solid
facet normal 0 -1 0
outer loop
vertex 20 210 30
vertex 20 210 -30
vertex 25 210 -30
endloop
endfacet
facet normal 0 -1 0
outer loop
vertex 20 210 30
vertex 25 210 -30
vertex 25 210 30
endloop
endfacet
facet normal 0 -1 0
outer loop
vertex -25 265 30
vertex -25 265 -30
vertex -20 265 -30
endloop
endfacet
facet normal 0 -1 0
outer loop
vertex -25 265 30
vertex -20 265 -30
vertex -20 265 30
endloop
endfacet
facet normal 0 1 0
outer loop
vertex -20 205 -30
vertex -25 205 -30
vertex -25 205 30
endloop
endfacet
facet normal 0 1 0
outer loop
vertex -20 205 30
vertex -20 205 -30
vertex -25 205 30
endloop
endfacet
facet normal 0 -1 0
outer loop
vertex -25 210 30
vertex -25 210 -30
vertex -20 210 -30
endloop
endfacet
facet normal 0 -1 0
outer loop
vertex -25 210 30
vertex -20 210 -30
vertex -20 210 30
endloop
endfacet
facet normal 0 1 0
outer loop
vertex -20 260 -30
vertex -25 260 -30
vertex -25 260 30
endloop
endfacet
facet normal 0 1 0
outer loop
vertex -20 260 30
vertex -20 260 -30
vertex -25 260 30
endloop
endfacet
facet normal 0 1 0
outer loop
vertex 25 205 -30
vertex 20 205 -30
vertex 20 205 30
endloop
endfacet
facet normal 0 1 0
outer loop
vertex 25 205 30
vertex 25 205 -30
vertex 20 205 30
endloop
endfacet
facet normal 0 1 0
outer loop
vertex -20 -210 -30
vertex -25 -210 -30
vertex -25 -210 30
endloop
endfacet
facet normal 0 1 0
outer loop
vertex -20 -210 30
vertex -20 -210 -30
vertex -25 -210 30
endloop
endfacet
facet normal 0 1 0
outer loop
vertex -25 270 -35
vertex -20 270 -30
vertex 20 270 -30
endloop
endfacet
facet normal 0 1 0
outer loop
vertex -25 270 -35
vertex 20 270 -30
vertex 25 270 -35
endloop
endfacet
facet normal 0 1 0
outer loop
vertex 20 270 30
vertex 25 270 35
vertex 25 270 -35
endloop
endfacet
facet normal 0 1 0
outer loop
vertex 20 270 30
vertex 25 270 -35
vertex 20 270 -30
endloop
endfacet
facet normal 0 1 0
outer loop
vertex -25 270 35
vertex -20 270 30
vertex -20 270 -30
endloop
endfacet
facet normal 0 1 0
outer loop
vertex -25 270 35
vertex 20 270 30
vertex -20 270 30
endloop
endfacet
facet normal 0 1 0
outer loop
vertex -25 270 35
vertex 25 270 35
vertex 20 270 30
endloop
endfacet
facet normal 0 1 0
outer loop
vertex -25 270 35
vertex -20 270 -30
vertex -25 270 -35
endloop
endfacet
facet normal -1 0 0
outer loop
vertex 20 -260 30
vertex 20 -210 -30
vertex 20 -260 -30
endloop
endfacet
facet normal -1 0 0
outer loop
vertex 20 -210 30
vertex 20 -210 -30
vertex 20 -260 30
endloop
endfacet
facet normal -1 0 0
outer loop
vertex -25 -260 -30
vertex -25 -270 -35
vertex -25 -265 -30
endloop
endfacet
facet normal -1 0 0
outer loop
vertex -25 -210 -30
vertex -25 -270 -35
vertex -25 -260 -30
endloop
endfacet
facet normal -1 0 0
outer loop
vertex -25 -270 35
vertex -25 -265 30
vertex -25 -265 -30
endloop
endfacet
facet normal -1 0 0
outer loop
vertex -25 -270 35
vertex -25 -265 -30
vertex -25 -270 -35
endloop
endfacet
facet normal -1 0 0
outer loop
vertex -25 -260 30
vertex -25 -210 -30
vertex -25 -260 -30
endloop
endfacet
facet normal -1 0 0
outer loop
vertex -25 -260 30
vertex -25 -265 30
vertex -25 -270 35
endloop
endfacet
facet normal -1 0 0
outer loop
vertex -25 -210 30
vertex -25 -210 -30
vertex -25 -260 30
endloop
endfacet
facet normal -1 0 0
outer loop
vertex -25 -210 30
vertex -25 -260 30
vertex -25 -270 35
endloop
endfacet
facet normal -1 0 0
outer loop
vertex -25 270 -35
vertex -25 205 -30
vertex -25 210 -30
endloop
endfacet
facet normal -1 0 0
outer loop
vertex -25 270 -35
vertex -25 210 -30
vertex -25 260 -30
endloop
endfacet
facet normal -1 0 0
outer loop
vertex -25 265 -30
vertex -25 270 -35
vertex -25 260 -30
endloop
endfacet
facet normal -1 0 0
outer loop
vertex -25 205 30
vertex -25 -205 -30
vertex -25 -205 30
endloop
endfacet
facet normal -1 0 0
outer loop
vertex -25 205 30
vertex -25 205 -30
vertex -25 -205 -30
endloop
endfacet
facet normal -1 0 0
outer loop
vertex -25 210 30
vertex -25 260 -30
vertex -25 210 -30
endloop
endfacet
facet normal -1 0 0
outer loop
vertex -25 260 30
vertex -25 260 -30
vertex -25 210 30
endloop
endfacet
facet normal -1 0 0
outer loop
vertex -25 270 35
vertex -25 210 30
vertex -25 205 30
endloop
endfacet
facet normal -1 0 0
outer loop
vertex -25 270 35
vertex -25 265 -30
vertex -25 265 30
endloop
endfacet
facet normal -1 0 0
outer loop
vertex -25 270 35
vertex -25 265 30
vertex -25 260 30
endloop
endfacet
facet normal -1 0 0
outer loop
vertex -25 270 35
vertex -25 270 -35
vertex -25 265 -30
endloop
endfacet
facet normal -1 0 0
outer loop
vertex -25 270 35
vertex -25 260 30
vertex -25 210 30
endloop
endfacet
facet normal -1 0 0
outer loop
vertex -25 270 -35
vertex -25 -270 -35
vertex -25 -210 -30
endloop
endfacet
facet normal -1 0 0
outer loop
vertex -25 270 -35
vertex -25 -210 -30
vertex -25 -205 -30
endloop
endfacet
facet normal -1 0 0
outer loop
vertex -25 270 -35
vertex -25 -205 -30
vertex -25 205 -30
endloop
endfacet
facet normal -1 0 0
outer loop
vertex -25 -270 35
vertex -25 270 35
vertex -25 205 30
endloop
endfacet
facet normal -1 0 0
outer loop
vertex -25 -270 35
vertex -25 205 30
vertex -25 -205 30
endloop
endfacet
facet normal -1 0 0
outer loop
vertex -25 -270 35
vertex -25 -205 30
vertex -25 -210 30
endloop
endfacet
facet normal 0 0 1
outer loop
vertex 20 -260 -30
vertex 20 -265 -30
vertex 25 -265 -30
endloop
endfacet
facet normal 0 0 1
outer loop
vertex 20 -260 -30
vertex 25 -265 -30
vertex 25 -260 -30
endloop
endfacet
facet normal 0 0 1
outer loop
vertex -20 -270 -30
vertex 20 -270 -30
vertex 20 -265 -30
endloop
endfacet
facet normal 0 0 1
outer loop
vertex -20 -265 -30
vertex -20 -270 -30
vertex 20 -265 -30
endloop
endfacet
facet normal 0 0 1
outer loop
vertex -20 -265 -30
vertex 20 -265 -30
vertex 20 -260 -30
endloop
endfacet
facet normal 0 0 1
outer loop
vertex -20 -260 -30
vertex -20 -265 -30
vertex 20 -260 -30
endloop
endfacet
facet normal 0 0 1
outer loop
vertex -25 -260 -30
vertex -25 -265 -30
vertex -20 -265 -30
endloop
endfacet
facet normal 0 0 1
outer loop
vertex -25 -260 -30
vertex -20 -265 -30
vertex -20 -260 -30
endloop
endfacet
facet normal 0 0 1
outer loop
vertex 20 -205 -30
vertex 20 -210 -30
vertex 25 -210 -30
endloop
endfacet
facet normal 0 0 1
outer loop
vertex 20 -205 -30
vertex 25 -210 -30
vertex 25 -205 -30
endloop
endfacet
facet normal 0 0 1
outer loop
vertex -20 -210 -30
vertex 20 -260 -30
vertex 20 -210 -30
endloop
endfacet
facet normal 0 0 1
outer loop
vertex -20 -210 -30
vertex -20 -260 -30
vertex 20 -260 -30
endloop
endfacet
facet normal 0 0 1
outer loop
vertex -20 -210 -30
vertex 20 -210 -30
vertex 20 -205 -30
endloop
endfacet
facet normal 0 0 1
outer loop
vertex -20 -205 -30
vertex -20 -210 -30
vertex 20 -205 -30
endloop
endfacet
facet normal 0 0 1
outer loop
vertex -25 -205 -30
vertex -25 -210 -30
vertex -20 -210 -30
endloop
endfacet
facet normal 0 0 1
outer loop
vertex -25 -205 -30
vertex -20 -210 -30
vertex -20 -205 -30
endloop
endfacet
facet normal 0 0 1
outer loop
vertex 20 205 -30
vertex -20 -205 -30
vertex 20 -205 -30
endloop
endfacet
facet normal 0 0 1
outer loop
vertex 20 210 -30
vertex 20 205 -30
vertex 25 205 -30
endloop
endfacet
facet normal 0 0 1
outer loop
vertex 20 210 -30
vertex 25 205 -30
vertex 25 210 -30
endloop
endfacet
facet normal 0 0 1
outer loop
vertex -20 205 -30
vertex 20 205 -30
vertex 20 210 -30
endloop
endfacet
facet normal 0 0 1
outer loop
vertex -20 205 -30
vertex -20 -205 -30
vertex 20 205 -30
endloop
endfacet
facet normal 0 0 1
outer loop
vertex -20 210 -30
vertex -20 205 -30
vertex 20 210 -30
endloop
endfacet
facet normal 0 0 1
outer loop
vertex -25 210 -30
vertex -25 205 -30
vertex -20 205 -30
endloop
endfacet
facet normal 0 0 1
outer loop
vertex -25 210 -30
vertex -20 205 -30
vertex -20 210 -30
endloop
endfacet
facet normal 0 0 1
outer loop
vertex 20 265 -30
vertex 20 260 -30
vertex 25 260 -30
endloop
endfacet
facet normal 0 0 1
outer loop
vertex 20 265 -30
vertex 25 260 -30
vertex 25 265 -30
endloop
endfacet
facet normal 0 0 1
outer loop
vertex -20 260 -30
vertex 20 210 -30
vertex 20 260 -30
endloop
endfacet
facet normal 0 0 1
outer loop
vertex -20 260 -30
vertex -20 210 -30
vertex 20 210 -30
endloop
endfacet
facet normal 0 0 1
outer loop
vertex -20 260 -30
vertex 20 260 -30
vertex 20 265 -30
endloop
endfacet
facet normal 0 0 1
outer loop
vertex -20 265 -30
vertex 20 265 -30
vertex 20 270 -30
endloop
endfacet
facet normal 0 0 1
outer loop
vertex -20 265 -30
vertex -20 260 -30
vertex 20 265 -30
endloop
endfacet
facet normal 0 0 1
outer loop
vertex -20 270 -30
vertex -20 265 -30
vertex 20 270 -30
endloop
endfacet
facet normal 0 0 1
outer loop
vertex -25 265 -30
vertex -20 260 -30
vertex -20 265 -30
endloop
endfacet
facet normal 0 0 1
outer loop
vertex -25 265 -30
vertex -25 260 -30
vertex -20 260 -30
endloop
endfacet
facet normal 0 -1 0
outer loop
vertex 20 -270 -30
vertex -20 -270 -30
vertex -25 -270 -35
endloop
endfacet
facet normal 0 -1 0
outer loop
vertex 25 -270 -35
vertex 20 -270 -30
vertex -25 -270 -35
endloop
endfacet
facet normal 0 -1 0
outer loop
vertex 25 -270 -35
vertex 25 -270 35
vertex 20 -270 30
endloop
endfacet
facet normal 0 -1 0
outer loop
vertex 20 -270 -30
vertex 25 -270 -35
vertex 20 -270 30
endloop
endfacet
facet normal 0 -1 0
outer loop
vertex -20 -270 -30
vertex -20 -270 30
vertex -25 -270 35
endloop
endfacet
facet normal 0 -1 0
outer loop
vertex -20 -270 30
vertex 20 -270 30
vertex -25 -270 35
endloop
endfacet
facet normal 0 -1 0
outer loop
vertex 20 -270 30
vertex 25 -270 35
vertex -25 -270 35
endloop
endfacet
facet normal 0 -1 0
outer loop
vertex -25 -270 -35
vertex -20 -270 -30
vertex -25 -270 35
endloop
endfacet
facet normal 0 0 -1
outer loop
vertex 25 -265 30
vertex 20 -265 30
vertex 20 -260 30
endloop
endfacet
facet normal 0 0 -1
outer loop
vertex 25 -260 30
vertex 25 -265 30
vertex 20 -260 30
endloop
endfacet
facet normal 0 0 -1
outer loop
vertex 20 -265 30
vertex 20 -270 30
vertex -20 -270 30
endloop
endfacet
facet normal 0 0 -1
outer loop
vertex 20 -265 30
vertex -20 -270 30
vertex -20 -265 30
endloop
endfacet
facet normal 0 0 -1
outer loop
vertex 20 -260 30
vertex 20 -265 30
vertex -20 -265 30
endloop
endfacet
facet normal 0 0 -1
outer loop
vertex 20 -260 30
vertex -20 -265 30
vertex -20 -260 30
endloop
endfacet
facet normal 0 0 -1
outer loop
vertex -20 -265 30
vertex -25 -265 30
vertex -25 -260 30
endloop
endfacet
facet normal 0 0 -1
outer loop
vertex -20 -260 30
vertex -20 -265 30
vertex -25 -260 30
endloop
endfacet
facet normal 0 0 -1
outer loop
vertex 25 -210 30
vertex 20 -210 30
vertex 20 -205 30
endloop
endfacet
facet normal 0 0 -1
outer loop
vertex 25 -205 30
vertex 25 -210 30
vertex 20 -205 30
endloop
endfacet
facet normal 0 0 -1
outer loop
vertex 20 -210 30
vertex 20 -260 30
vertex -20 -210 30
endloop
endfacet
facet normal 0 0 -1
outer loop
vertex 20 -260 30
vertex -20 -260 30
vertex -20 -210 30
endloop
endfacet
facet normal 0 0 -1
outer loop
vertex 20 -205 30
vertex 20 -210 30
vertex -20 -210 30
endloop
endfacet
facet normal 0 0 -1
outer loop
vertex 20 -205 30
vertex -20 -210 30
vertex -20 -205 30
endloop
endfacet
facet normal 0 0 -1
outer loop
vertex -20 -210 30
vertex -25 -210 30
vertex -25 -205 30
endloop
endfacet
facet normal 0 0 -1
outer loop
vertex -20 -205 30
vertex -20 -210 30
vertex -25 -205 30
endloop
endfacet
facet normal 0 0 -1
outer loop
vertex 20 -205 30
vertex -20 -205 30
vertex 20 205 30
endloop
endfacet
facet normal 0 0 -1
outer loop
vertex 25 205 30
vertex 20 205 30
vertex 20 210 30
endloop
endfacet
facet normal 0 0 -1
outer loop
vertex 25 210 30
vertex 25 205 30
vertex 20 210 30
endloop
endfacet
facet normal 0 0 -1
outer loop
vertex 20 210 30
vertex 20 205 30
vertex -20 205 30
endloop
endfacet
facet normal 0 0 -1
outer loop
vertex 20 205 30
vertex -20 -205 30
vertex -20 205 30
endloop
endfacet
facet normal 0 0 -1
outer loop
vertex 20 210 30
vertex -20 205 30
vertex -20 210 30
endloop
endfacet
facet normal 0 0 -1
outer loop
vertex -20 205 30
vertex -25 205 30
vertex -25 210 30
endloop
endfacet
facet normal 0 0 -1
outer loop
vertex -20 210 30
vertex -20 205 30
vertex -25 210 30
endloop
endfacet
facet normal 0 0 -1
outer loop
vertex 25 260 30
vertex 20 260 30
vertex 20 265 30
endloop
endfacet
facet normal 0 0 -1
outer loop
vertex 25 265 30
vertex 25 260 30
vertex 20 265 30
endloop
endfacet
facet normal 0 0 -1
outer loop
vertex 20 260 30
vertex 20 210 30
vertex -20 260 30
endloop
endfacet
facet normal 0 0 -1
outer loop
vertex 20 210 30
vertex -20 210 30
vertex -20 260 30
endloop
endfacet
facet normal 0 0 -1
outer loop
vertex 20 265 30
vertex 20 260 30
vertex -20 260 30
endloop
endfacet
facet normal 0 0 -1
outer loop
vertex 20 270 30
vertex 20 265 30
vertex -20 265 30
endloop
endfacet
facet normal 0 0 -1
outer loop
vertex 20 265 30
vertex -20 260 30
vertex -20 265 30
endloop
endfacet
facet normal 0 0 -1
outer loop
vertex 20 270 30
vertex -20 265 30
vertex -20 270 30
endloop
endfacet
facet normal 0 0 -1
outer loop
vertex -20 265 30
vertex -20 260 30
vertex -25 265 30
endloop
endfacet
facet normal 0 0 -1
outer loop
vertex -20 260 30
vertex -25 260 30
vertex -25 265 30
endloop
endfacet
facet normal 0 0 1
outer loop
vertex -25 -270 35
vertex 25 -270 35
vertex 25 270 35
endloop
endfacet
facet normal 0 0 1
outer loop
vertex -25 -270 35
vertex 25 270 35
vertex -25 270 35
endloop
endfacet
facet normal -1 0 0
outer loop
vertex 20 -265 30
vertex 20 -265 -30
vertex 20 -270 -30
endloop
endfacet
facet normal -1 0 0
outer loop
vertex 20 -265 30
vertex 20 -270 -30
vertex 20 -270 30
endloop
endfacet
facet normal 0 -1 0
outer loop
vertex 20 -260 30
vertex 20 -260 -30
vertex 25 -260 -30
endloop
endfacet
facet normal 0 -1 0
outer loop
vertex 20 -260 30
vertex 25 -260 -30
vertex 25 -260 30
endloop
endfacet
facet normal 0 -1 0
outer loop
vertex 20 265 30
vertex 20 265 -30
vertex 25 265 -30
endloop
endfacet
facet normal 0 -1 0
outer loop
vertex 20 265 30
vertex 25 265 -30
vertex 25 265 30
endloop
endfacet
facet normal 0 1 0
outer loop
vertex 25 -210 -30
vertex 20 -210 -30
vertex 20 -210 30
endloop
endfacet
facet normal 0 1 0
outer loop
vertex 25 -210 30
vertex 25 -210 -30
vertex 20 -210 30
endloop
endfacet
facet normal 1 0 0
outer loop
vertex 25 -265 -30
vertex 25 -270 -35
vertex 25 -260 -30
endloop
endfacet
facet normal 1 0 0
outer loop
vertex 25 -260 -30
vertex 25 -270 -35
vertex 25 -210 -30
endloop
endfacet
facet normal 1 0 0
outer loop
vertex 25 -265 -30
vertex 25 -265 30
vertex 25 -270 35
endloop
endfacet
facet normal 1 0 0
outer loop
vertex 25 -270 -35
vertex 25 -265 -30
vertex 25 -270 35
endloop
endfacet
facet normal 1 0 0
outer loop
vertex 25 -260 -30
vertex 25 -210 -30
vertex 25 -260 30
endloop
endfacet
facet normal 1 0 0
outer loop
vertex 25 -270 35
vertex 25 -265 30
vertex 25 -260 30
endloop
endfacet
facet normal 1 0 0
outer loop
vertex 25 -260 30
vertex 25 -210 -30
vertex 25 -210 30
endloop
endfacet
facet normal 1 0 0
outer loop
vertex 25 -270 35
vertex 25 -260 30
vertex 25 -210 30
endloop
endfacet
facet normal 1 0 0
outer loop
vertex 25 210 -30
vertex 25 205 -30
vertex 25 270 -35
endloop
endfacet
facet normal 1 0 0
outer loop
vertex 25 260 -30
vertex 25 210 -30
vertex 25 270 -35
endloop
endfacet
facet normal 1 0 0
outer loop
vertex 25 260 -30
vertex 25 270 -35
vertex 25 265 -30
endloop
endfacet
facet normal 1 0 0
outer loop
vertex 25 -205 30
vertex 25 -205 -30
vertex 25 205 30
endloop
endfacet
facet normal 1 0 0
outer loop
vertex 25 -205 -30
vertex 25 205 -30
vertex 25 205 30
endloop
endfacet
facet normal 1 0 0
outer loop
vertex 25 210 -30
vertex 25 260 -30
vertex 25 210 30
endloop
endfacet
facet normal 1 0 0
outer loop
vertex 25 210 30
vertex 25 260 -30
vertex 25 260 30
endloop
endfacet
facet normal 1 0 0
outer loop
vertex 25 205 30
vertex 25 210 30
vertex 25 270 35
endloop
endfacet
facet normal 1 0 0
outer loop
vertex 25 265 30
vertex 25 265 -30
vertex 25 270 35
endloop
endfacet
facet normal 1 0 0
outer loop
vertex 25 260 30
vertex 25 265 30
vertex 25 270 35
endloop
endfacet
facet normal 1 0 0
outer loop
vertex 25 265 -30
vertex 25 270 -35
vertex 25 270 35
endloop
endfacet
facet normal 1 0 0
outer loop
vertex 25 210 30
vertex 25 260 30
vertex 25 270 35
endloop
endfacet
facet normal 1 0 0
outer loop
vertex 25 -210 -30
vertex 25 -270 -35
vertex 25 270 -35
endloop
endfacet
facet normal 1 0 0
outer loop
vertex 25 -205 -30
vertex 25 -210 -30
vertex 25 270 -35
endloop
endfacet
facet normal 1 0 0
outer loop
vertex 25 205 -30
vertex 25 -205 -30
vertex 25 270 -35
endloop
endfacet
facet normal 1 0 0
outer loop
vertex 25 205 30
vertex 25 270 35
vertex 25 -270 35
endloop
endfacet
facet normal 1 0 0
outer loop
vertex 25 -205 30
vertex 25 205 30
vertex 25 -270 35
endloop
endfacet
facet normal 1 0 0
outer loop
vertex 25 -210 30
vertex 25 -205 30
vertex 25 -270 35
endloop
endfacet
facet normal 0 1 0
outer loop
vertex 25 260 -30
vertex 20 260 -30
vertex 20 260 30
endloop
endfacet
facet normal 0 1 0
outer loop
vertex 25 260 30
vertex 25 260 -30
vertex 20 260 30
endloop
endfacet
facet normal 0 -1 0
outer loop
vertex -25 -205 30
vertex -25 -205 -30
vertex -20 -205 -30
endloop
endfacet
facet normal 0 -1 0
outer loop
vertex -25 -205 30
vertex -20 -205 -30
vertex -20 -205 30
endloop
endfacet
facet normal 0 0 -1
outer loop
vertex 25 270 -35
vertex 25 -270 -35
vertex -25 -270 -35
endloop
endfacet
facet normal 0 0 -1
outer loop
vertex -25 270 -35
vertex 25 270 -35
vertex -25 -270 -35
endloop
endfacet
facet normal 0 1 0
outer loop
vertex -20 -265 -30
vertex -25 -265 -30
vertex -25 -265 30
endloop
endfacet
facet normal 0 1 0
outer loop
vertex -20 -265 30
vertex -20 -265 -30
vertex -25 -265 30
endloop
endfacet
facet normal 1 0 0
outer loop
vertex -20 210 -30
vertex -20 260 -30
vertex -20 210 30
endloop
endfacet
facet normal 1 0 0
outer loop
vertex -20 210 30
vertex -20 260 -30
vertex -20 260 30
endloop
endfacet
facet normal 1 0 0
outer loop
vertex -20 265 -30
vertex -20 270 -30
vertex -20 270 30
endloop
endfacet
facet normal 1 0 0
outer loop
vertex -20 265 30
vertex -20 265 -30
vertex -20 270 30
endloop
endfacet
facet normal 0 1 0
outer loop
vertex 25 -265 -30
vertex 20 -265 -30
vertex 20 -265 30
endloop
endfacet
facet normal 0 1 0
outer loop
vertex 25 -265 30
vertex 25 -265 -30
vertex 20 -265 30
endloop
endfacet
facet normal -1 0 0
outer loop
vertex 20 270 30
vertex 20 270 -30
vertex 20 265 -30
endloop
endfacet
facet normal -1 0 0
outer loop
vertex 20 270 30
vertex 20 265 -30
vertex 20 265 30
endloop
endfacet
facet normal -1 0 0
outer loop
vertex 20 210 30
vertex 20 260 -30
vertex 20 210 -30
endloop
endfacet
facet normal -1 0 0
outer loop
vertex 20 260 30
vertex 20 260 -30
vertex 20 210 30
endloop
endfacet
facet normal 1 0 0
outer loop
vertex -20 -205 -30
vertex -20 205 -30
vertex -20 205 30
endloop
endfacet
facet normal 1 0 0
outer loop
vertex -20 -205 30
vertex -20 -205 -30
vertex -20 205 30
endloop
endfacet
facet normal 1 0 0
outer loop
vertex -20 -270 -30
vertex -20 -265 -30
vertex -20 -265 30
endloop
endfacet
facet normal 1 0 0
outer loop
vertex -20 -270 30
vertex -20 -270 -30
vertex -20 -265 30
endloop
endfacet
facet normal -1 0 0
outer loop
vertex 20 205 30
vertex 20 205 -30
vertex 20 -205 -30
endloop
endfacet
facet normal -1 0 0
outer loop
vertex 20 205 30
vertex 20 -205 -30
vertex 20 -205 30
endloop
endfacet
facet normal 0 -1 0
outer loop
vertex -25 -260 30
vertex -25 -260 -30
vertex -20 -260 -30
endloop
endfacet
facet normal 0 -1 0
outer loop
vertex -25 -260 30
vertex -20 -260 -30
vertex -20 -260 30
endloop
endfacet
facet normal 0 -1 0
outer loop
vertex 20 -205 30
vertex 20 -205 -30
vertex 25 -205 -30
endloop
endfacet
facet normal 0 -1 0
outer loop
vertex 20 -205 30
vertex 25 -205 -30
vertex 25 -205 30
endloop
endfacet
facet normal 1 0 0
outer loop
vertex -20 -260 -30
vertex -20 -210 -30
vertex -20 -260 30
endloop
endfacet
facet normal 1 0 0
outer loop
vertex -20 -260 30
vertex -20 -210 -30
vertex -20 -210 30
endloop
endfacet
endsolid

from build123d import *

# Parameters (mm, degrees)
SKETCH1_W               = 50
SKETCH1_H               = 70
BOSS_EXTRUDE1_DEPTH     = 270
SHELL1_T                = -5
CUT_EXTRUDE1_DEPTH      = 277.812210713
CUT_EXTRUDE1_DEPTH_BACK = 277.812210713
SKETCH2_W               = 5
SKETCH2_H               = 60


with BuildPart() as part:
    # Sketch1 → Boss-Extrude1 (new, symmetric)
    with BuildSketch(Plane(origin=(0, 0, 0), x_dir=(-1, 0, 0), z_dir=(0, 1, 0))):
        Rectangle(SKETCH1_W, SKETCH1_H)
    extrude(amount=BOSS_EXTRUDE1_DEPTH, both=True)

    # Shell1
    shell1_openings = [part.faces().sort_by_distance(p)[0] for p in [
        (0, 270, 0),
        (0, -270, 0),
    ]]
    offset(amount=SHELL1_T, openings=shell1_openings, kind=Kind.INTERSECTION)

    # Sketch2 → Cut-Extrude1 (cut, two sides: drawn at the far end of the back side and taken through both)
    with BuildSketch(Plane.YZ.offset(25).offset(-CUT_EXTRUDE1_DEPTH_BACK)):
        with Locations((-262.5, 0)):
            Rectangle(SKETCH2_W, SKETCH2_H)
        with Locations((-207.5, 0)):
            Rectangle(SKETCH2_W, SKETCH2_H)
        with Locations((207.5, 0)):
            Rectangle(SKETCH2_W, SKETCH2_H)
        with Locations((262.5, 0)):
            Rectangle(SKETCH2_W, SKETCH2_H)
    extrude(amount=CUT_EXTRUDE1_DEPTH + CUT_EXTRUDE1_DEPTH_BACK, mode=Mode.SUBTRACT)


solid = part.part
